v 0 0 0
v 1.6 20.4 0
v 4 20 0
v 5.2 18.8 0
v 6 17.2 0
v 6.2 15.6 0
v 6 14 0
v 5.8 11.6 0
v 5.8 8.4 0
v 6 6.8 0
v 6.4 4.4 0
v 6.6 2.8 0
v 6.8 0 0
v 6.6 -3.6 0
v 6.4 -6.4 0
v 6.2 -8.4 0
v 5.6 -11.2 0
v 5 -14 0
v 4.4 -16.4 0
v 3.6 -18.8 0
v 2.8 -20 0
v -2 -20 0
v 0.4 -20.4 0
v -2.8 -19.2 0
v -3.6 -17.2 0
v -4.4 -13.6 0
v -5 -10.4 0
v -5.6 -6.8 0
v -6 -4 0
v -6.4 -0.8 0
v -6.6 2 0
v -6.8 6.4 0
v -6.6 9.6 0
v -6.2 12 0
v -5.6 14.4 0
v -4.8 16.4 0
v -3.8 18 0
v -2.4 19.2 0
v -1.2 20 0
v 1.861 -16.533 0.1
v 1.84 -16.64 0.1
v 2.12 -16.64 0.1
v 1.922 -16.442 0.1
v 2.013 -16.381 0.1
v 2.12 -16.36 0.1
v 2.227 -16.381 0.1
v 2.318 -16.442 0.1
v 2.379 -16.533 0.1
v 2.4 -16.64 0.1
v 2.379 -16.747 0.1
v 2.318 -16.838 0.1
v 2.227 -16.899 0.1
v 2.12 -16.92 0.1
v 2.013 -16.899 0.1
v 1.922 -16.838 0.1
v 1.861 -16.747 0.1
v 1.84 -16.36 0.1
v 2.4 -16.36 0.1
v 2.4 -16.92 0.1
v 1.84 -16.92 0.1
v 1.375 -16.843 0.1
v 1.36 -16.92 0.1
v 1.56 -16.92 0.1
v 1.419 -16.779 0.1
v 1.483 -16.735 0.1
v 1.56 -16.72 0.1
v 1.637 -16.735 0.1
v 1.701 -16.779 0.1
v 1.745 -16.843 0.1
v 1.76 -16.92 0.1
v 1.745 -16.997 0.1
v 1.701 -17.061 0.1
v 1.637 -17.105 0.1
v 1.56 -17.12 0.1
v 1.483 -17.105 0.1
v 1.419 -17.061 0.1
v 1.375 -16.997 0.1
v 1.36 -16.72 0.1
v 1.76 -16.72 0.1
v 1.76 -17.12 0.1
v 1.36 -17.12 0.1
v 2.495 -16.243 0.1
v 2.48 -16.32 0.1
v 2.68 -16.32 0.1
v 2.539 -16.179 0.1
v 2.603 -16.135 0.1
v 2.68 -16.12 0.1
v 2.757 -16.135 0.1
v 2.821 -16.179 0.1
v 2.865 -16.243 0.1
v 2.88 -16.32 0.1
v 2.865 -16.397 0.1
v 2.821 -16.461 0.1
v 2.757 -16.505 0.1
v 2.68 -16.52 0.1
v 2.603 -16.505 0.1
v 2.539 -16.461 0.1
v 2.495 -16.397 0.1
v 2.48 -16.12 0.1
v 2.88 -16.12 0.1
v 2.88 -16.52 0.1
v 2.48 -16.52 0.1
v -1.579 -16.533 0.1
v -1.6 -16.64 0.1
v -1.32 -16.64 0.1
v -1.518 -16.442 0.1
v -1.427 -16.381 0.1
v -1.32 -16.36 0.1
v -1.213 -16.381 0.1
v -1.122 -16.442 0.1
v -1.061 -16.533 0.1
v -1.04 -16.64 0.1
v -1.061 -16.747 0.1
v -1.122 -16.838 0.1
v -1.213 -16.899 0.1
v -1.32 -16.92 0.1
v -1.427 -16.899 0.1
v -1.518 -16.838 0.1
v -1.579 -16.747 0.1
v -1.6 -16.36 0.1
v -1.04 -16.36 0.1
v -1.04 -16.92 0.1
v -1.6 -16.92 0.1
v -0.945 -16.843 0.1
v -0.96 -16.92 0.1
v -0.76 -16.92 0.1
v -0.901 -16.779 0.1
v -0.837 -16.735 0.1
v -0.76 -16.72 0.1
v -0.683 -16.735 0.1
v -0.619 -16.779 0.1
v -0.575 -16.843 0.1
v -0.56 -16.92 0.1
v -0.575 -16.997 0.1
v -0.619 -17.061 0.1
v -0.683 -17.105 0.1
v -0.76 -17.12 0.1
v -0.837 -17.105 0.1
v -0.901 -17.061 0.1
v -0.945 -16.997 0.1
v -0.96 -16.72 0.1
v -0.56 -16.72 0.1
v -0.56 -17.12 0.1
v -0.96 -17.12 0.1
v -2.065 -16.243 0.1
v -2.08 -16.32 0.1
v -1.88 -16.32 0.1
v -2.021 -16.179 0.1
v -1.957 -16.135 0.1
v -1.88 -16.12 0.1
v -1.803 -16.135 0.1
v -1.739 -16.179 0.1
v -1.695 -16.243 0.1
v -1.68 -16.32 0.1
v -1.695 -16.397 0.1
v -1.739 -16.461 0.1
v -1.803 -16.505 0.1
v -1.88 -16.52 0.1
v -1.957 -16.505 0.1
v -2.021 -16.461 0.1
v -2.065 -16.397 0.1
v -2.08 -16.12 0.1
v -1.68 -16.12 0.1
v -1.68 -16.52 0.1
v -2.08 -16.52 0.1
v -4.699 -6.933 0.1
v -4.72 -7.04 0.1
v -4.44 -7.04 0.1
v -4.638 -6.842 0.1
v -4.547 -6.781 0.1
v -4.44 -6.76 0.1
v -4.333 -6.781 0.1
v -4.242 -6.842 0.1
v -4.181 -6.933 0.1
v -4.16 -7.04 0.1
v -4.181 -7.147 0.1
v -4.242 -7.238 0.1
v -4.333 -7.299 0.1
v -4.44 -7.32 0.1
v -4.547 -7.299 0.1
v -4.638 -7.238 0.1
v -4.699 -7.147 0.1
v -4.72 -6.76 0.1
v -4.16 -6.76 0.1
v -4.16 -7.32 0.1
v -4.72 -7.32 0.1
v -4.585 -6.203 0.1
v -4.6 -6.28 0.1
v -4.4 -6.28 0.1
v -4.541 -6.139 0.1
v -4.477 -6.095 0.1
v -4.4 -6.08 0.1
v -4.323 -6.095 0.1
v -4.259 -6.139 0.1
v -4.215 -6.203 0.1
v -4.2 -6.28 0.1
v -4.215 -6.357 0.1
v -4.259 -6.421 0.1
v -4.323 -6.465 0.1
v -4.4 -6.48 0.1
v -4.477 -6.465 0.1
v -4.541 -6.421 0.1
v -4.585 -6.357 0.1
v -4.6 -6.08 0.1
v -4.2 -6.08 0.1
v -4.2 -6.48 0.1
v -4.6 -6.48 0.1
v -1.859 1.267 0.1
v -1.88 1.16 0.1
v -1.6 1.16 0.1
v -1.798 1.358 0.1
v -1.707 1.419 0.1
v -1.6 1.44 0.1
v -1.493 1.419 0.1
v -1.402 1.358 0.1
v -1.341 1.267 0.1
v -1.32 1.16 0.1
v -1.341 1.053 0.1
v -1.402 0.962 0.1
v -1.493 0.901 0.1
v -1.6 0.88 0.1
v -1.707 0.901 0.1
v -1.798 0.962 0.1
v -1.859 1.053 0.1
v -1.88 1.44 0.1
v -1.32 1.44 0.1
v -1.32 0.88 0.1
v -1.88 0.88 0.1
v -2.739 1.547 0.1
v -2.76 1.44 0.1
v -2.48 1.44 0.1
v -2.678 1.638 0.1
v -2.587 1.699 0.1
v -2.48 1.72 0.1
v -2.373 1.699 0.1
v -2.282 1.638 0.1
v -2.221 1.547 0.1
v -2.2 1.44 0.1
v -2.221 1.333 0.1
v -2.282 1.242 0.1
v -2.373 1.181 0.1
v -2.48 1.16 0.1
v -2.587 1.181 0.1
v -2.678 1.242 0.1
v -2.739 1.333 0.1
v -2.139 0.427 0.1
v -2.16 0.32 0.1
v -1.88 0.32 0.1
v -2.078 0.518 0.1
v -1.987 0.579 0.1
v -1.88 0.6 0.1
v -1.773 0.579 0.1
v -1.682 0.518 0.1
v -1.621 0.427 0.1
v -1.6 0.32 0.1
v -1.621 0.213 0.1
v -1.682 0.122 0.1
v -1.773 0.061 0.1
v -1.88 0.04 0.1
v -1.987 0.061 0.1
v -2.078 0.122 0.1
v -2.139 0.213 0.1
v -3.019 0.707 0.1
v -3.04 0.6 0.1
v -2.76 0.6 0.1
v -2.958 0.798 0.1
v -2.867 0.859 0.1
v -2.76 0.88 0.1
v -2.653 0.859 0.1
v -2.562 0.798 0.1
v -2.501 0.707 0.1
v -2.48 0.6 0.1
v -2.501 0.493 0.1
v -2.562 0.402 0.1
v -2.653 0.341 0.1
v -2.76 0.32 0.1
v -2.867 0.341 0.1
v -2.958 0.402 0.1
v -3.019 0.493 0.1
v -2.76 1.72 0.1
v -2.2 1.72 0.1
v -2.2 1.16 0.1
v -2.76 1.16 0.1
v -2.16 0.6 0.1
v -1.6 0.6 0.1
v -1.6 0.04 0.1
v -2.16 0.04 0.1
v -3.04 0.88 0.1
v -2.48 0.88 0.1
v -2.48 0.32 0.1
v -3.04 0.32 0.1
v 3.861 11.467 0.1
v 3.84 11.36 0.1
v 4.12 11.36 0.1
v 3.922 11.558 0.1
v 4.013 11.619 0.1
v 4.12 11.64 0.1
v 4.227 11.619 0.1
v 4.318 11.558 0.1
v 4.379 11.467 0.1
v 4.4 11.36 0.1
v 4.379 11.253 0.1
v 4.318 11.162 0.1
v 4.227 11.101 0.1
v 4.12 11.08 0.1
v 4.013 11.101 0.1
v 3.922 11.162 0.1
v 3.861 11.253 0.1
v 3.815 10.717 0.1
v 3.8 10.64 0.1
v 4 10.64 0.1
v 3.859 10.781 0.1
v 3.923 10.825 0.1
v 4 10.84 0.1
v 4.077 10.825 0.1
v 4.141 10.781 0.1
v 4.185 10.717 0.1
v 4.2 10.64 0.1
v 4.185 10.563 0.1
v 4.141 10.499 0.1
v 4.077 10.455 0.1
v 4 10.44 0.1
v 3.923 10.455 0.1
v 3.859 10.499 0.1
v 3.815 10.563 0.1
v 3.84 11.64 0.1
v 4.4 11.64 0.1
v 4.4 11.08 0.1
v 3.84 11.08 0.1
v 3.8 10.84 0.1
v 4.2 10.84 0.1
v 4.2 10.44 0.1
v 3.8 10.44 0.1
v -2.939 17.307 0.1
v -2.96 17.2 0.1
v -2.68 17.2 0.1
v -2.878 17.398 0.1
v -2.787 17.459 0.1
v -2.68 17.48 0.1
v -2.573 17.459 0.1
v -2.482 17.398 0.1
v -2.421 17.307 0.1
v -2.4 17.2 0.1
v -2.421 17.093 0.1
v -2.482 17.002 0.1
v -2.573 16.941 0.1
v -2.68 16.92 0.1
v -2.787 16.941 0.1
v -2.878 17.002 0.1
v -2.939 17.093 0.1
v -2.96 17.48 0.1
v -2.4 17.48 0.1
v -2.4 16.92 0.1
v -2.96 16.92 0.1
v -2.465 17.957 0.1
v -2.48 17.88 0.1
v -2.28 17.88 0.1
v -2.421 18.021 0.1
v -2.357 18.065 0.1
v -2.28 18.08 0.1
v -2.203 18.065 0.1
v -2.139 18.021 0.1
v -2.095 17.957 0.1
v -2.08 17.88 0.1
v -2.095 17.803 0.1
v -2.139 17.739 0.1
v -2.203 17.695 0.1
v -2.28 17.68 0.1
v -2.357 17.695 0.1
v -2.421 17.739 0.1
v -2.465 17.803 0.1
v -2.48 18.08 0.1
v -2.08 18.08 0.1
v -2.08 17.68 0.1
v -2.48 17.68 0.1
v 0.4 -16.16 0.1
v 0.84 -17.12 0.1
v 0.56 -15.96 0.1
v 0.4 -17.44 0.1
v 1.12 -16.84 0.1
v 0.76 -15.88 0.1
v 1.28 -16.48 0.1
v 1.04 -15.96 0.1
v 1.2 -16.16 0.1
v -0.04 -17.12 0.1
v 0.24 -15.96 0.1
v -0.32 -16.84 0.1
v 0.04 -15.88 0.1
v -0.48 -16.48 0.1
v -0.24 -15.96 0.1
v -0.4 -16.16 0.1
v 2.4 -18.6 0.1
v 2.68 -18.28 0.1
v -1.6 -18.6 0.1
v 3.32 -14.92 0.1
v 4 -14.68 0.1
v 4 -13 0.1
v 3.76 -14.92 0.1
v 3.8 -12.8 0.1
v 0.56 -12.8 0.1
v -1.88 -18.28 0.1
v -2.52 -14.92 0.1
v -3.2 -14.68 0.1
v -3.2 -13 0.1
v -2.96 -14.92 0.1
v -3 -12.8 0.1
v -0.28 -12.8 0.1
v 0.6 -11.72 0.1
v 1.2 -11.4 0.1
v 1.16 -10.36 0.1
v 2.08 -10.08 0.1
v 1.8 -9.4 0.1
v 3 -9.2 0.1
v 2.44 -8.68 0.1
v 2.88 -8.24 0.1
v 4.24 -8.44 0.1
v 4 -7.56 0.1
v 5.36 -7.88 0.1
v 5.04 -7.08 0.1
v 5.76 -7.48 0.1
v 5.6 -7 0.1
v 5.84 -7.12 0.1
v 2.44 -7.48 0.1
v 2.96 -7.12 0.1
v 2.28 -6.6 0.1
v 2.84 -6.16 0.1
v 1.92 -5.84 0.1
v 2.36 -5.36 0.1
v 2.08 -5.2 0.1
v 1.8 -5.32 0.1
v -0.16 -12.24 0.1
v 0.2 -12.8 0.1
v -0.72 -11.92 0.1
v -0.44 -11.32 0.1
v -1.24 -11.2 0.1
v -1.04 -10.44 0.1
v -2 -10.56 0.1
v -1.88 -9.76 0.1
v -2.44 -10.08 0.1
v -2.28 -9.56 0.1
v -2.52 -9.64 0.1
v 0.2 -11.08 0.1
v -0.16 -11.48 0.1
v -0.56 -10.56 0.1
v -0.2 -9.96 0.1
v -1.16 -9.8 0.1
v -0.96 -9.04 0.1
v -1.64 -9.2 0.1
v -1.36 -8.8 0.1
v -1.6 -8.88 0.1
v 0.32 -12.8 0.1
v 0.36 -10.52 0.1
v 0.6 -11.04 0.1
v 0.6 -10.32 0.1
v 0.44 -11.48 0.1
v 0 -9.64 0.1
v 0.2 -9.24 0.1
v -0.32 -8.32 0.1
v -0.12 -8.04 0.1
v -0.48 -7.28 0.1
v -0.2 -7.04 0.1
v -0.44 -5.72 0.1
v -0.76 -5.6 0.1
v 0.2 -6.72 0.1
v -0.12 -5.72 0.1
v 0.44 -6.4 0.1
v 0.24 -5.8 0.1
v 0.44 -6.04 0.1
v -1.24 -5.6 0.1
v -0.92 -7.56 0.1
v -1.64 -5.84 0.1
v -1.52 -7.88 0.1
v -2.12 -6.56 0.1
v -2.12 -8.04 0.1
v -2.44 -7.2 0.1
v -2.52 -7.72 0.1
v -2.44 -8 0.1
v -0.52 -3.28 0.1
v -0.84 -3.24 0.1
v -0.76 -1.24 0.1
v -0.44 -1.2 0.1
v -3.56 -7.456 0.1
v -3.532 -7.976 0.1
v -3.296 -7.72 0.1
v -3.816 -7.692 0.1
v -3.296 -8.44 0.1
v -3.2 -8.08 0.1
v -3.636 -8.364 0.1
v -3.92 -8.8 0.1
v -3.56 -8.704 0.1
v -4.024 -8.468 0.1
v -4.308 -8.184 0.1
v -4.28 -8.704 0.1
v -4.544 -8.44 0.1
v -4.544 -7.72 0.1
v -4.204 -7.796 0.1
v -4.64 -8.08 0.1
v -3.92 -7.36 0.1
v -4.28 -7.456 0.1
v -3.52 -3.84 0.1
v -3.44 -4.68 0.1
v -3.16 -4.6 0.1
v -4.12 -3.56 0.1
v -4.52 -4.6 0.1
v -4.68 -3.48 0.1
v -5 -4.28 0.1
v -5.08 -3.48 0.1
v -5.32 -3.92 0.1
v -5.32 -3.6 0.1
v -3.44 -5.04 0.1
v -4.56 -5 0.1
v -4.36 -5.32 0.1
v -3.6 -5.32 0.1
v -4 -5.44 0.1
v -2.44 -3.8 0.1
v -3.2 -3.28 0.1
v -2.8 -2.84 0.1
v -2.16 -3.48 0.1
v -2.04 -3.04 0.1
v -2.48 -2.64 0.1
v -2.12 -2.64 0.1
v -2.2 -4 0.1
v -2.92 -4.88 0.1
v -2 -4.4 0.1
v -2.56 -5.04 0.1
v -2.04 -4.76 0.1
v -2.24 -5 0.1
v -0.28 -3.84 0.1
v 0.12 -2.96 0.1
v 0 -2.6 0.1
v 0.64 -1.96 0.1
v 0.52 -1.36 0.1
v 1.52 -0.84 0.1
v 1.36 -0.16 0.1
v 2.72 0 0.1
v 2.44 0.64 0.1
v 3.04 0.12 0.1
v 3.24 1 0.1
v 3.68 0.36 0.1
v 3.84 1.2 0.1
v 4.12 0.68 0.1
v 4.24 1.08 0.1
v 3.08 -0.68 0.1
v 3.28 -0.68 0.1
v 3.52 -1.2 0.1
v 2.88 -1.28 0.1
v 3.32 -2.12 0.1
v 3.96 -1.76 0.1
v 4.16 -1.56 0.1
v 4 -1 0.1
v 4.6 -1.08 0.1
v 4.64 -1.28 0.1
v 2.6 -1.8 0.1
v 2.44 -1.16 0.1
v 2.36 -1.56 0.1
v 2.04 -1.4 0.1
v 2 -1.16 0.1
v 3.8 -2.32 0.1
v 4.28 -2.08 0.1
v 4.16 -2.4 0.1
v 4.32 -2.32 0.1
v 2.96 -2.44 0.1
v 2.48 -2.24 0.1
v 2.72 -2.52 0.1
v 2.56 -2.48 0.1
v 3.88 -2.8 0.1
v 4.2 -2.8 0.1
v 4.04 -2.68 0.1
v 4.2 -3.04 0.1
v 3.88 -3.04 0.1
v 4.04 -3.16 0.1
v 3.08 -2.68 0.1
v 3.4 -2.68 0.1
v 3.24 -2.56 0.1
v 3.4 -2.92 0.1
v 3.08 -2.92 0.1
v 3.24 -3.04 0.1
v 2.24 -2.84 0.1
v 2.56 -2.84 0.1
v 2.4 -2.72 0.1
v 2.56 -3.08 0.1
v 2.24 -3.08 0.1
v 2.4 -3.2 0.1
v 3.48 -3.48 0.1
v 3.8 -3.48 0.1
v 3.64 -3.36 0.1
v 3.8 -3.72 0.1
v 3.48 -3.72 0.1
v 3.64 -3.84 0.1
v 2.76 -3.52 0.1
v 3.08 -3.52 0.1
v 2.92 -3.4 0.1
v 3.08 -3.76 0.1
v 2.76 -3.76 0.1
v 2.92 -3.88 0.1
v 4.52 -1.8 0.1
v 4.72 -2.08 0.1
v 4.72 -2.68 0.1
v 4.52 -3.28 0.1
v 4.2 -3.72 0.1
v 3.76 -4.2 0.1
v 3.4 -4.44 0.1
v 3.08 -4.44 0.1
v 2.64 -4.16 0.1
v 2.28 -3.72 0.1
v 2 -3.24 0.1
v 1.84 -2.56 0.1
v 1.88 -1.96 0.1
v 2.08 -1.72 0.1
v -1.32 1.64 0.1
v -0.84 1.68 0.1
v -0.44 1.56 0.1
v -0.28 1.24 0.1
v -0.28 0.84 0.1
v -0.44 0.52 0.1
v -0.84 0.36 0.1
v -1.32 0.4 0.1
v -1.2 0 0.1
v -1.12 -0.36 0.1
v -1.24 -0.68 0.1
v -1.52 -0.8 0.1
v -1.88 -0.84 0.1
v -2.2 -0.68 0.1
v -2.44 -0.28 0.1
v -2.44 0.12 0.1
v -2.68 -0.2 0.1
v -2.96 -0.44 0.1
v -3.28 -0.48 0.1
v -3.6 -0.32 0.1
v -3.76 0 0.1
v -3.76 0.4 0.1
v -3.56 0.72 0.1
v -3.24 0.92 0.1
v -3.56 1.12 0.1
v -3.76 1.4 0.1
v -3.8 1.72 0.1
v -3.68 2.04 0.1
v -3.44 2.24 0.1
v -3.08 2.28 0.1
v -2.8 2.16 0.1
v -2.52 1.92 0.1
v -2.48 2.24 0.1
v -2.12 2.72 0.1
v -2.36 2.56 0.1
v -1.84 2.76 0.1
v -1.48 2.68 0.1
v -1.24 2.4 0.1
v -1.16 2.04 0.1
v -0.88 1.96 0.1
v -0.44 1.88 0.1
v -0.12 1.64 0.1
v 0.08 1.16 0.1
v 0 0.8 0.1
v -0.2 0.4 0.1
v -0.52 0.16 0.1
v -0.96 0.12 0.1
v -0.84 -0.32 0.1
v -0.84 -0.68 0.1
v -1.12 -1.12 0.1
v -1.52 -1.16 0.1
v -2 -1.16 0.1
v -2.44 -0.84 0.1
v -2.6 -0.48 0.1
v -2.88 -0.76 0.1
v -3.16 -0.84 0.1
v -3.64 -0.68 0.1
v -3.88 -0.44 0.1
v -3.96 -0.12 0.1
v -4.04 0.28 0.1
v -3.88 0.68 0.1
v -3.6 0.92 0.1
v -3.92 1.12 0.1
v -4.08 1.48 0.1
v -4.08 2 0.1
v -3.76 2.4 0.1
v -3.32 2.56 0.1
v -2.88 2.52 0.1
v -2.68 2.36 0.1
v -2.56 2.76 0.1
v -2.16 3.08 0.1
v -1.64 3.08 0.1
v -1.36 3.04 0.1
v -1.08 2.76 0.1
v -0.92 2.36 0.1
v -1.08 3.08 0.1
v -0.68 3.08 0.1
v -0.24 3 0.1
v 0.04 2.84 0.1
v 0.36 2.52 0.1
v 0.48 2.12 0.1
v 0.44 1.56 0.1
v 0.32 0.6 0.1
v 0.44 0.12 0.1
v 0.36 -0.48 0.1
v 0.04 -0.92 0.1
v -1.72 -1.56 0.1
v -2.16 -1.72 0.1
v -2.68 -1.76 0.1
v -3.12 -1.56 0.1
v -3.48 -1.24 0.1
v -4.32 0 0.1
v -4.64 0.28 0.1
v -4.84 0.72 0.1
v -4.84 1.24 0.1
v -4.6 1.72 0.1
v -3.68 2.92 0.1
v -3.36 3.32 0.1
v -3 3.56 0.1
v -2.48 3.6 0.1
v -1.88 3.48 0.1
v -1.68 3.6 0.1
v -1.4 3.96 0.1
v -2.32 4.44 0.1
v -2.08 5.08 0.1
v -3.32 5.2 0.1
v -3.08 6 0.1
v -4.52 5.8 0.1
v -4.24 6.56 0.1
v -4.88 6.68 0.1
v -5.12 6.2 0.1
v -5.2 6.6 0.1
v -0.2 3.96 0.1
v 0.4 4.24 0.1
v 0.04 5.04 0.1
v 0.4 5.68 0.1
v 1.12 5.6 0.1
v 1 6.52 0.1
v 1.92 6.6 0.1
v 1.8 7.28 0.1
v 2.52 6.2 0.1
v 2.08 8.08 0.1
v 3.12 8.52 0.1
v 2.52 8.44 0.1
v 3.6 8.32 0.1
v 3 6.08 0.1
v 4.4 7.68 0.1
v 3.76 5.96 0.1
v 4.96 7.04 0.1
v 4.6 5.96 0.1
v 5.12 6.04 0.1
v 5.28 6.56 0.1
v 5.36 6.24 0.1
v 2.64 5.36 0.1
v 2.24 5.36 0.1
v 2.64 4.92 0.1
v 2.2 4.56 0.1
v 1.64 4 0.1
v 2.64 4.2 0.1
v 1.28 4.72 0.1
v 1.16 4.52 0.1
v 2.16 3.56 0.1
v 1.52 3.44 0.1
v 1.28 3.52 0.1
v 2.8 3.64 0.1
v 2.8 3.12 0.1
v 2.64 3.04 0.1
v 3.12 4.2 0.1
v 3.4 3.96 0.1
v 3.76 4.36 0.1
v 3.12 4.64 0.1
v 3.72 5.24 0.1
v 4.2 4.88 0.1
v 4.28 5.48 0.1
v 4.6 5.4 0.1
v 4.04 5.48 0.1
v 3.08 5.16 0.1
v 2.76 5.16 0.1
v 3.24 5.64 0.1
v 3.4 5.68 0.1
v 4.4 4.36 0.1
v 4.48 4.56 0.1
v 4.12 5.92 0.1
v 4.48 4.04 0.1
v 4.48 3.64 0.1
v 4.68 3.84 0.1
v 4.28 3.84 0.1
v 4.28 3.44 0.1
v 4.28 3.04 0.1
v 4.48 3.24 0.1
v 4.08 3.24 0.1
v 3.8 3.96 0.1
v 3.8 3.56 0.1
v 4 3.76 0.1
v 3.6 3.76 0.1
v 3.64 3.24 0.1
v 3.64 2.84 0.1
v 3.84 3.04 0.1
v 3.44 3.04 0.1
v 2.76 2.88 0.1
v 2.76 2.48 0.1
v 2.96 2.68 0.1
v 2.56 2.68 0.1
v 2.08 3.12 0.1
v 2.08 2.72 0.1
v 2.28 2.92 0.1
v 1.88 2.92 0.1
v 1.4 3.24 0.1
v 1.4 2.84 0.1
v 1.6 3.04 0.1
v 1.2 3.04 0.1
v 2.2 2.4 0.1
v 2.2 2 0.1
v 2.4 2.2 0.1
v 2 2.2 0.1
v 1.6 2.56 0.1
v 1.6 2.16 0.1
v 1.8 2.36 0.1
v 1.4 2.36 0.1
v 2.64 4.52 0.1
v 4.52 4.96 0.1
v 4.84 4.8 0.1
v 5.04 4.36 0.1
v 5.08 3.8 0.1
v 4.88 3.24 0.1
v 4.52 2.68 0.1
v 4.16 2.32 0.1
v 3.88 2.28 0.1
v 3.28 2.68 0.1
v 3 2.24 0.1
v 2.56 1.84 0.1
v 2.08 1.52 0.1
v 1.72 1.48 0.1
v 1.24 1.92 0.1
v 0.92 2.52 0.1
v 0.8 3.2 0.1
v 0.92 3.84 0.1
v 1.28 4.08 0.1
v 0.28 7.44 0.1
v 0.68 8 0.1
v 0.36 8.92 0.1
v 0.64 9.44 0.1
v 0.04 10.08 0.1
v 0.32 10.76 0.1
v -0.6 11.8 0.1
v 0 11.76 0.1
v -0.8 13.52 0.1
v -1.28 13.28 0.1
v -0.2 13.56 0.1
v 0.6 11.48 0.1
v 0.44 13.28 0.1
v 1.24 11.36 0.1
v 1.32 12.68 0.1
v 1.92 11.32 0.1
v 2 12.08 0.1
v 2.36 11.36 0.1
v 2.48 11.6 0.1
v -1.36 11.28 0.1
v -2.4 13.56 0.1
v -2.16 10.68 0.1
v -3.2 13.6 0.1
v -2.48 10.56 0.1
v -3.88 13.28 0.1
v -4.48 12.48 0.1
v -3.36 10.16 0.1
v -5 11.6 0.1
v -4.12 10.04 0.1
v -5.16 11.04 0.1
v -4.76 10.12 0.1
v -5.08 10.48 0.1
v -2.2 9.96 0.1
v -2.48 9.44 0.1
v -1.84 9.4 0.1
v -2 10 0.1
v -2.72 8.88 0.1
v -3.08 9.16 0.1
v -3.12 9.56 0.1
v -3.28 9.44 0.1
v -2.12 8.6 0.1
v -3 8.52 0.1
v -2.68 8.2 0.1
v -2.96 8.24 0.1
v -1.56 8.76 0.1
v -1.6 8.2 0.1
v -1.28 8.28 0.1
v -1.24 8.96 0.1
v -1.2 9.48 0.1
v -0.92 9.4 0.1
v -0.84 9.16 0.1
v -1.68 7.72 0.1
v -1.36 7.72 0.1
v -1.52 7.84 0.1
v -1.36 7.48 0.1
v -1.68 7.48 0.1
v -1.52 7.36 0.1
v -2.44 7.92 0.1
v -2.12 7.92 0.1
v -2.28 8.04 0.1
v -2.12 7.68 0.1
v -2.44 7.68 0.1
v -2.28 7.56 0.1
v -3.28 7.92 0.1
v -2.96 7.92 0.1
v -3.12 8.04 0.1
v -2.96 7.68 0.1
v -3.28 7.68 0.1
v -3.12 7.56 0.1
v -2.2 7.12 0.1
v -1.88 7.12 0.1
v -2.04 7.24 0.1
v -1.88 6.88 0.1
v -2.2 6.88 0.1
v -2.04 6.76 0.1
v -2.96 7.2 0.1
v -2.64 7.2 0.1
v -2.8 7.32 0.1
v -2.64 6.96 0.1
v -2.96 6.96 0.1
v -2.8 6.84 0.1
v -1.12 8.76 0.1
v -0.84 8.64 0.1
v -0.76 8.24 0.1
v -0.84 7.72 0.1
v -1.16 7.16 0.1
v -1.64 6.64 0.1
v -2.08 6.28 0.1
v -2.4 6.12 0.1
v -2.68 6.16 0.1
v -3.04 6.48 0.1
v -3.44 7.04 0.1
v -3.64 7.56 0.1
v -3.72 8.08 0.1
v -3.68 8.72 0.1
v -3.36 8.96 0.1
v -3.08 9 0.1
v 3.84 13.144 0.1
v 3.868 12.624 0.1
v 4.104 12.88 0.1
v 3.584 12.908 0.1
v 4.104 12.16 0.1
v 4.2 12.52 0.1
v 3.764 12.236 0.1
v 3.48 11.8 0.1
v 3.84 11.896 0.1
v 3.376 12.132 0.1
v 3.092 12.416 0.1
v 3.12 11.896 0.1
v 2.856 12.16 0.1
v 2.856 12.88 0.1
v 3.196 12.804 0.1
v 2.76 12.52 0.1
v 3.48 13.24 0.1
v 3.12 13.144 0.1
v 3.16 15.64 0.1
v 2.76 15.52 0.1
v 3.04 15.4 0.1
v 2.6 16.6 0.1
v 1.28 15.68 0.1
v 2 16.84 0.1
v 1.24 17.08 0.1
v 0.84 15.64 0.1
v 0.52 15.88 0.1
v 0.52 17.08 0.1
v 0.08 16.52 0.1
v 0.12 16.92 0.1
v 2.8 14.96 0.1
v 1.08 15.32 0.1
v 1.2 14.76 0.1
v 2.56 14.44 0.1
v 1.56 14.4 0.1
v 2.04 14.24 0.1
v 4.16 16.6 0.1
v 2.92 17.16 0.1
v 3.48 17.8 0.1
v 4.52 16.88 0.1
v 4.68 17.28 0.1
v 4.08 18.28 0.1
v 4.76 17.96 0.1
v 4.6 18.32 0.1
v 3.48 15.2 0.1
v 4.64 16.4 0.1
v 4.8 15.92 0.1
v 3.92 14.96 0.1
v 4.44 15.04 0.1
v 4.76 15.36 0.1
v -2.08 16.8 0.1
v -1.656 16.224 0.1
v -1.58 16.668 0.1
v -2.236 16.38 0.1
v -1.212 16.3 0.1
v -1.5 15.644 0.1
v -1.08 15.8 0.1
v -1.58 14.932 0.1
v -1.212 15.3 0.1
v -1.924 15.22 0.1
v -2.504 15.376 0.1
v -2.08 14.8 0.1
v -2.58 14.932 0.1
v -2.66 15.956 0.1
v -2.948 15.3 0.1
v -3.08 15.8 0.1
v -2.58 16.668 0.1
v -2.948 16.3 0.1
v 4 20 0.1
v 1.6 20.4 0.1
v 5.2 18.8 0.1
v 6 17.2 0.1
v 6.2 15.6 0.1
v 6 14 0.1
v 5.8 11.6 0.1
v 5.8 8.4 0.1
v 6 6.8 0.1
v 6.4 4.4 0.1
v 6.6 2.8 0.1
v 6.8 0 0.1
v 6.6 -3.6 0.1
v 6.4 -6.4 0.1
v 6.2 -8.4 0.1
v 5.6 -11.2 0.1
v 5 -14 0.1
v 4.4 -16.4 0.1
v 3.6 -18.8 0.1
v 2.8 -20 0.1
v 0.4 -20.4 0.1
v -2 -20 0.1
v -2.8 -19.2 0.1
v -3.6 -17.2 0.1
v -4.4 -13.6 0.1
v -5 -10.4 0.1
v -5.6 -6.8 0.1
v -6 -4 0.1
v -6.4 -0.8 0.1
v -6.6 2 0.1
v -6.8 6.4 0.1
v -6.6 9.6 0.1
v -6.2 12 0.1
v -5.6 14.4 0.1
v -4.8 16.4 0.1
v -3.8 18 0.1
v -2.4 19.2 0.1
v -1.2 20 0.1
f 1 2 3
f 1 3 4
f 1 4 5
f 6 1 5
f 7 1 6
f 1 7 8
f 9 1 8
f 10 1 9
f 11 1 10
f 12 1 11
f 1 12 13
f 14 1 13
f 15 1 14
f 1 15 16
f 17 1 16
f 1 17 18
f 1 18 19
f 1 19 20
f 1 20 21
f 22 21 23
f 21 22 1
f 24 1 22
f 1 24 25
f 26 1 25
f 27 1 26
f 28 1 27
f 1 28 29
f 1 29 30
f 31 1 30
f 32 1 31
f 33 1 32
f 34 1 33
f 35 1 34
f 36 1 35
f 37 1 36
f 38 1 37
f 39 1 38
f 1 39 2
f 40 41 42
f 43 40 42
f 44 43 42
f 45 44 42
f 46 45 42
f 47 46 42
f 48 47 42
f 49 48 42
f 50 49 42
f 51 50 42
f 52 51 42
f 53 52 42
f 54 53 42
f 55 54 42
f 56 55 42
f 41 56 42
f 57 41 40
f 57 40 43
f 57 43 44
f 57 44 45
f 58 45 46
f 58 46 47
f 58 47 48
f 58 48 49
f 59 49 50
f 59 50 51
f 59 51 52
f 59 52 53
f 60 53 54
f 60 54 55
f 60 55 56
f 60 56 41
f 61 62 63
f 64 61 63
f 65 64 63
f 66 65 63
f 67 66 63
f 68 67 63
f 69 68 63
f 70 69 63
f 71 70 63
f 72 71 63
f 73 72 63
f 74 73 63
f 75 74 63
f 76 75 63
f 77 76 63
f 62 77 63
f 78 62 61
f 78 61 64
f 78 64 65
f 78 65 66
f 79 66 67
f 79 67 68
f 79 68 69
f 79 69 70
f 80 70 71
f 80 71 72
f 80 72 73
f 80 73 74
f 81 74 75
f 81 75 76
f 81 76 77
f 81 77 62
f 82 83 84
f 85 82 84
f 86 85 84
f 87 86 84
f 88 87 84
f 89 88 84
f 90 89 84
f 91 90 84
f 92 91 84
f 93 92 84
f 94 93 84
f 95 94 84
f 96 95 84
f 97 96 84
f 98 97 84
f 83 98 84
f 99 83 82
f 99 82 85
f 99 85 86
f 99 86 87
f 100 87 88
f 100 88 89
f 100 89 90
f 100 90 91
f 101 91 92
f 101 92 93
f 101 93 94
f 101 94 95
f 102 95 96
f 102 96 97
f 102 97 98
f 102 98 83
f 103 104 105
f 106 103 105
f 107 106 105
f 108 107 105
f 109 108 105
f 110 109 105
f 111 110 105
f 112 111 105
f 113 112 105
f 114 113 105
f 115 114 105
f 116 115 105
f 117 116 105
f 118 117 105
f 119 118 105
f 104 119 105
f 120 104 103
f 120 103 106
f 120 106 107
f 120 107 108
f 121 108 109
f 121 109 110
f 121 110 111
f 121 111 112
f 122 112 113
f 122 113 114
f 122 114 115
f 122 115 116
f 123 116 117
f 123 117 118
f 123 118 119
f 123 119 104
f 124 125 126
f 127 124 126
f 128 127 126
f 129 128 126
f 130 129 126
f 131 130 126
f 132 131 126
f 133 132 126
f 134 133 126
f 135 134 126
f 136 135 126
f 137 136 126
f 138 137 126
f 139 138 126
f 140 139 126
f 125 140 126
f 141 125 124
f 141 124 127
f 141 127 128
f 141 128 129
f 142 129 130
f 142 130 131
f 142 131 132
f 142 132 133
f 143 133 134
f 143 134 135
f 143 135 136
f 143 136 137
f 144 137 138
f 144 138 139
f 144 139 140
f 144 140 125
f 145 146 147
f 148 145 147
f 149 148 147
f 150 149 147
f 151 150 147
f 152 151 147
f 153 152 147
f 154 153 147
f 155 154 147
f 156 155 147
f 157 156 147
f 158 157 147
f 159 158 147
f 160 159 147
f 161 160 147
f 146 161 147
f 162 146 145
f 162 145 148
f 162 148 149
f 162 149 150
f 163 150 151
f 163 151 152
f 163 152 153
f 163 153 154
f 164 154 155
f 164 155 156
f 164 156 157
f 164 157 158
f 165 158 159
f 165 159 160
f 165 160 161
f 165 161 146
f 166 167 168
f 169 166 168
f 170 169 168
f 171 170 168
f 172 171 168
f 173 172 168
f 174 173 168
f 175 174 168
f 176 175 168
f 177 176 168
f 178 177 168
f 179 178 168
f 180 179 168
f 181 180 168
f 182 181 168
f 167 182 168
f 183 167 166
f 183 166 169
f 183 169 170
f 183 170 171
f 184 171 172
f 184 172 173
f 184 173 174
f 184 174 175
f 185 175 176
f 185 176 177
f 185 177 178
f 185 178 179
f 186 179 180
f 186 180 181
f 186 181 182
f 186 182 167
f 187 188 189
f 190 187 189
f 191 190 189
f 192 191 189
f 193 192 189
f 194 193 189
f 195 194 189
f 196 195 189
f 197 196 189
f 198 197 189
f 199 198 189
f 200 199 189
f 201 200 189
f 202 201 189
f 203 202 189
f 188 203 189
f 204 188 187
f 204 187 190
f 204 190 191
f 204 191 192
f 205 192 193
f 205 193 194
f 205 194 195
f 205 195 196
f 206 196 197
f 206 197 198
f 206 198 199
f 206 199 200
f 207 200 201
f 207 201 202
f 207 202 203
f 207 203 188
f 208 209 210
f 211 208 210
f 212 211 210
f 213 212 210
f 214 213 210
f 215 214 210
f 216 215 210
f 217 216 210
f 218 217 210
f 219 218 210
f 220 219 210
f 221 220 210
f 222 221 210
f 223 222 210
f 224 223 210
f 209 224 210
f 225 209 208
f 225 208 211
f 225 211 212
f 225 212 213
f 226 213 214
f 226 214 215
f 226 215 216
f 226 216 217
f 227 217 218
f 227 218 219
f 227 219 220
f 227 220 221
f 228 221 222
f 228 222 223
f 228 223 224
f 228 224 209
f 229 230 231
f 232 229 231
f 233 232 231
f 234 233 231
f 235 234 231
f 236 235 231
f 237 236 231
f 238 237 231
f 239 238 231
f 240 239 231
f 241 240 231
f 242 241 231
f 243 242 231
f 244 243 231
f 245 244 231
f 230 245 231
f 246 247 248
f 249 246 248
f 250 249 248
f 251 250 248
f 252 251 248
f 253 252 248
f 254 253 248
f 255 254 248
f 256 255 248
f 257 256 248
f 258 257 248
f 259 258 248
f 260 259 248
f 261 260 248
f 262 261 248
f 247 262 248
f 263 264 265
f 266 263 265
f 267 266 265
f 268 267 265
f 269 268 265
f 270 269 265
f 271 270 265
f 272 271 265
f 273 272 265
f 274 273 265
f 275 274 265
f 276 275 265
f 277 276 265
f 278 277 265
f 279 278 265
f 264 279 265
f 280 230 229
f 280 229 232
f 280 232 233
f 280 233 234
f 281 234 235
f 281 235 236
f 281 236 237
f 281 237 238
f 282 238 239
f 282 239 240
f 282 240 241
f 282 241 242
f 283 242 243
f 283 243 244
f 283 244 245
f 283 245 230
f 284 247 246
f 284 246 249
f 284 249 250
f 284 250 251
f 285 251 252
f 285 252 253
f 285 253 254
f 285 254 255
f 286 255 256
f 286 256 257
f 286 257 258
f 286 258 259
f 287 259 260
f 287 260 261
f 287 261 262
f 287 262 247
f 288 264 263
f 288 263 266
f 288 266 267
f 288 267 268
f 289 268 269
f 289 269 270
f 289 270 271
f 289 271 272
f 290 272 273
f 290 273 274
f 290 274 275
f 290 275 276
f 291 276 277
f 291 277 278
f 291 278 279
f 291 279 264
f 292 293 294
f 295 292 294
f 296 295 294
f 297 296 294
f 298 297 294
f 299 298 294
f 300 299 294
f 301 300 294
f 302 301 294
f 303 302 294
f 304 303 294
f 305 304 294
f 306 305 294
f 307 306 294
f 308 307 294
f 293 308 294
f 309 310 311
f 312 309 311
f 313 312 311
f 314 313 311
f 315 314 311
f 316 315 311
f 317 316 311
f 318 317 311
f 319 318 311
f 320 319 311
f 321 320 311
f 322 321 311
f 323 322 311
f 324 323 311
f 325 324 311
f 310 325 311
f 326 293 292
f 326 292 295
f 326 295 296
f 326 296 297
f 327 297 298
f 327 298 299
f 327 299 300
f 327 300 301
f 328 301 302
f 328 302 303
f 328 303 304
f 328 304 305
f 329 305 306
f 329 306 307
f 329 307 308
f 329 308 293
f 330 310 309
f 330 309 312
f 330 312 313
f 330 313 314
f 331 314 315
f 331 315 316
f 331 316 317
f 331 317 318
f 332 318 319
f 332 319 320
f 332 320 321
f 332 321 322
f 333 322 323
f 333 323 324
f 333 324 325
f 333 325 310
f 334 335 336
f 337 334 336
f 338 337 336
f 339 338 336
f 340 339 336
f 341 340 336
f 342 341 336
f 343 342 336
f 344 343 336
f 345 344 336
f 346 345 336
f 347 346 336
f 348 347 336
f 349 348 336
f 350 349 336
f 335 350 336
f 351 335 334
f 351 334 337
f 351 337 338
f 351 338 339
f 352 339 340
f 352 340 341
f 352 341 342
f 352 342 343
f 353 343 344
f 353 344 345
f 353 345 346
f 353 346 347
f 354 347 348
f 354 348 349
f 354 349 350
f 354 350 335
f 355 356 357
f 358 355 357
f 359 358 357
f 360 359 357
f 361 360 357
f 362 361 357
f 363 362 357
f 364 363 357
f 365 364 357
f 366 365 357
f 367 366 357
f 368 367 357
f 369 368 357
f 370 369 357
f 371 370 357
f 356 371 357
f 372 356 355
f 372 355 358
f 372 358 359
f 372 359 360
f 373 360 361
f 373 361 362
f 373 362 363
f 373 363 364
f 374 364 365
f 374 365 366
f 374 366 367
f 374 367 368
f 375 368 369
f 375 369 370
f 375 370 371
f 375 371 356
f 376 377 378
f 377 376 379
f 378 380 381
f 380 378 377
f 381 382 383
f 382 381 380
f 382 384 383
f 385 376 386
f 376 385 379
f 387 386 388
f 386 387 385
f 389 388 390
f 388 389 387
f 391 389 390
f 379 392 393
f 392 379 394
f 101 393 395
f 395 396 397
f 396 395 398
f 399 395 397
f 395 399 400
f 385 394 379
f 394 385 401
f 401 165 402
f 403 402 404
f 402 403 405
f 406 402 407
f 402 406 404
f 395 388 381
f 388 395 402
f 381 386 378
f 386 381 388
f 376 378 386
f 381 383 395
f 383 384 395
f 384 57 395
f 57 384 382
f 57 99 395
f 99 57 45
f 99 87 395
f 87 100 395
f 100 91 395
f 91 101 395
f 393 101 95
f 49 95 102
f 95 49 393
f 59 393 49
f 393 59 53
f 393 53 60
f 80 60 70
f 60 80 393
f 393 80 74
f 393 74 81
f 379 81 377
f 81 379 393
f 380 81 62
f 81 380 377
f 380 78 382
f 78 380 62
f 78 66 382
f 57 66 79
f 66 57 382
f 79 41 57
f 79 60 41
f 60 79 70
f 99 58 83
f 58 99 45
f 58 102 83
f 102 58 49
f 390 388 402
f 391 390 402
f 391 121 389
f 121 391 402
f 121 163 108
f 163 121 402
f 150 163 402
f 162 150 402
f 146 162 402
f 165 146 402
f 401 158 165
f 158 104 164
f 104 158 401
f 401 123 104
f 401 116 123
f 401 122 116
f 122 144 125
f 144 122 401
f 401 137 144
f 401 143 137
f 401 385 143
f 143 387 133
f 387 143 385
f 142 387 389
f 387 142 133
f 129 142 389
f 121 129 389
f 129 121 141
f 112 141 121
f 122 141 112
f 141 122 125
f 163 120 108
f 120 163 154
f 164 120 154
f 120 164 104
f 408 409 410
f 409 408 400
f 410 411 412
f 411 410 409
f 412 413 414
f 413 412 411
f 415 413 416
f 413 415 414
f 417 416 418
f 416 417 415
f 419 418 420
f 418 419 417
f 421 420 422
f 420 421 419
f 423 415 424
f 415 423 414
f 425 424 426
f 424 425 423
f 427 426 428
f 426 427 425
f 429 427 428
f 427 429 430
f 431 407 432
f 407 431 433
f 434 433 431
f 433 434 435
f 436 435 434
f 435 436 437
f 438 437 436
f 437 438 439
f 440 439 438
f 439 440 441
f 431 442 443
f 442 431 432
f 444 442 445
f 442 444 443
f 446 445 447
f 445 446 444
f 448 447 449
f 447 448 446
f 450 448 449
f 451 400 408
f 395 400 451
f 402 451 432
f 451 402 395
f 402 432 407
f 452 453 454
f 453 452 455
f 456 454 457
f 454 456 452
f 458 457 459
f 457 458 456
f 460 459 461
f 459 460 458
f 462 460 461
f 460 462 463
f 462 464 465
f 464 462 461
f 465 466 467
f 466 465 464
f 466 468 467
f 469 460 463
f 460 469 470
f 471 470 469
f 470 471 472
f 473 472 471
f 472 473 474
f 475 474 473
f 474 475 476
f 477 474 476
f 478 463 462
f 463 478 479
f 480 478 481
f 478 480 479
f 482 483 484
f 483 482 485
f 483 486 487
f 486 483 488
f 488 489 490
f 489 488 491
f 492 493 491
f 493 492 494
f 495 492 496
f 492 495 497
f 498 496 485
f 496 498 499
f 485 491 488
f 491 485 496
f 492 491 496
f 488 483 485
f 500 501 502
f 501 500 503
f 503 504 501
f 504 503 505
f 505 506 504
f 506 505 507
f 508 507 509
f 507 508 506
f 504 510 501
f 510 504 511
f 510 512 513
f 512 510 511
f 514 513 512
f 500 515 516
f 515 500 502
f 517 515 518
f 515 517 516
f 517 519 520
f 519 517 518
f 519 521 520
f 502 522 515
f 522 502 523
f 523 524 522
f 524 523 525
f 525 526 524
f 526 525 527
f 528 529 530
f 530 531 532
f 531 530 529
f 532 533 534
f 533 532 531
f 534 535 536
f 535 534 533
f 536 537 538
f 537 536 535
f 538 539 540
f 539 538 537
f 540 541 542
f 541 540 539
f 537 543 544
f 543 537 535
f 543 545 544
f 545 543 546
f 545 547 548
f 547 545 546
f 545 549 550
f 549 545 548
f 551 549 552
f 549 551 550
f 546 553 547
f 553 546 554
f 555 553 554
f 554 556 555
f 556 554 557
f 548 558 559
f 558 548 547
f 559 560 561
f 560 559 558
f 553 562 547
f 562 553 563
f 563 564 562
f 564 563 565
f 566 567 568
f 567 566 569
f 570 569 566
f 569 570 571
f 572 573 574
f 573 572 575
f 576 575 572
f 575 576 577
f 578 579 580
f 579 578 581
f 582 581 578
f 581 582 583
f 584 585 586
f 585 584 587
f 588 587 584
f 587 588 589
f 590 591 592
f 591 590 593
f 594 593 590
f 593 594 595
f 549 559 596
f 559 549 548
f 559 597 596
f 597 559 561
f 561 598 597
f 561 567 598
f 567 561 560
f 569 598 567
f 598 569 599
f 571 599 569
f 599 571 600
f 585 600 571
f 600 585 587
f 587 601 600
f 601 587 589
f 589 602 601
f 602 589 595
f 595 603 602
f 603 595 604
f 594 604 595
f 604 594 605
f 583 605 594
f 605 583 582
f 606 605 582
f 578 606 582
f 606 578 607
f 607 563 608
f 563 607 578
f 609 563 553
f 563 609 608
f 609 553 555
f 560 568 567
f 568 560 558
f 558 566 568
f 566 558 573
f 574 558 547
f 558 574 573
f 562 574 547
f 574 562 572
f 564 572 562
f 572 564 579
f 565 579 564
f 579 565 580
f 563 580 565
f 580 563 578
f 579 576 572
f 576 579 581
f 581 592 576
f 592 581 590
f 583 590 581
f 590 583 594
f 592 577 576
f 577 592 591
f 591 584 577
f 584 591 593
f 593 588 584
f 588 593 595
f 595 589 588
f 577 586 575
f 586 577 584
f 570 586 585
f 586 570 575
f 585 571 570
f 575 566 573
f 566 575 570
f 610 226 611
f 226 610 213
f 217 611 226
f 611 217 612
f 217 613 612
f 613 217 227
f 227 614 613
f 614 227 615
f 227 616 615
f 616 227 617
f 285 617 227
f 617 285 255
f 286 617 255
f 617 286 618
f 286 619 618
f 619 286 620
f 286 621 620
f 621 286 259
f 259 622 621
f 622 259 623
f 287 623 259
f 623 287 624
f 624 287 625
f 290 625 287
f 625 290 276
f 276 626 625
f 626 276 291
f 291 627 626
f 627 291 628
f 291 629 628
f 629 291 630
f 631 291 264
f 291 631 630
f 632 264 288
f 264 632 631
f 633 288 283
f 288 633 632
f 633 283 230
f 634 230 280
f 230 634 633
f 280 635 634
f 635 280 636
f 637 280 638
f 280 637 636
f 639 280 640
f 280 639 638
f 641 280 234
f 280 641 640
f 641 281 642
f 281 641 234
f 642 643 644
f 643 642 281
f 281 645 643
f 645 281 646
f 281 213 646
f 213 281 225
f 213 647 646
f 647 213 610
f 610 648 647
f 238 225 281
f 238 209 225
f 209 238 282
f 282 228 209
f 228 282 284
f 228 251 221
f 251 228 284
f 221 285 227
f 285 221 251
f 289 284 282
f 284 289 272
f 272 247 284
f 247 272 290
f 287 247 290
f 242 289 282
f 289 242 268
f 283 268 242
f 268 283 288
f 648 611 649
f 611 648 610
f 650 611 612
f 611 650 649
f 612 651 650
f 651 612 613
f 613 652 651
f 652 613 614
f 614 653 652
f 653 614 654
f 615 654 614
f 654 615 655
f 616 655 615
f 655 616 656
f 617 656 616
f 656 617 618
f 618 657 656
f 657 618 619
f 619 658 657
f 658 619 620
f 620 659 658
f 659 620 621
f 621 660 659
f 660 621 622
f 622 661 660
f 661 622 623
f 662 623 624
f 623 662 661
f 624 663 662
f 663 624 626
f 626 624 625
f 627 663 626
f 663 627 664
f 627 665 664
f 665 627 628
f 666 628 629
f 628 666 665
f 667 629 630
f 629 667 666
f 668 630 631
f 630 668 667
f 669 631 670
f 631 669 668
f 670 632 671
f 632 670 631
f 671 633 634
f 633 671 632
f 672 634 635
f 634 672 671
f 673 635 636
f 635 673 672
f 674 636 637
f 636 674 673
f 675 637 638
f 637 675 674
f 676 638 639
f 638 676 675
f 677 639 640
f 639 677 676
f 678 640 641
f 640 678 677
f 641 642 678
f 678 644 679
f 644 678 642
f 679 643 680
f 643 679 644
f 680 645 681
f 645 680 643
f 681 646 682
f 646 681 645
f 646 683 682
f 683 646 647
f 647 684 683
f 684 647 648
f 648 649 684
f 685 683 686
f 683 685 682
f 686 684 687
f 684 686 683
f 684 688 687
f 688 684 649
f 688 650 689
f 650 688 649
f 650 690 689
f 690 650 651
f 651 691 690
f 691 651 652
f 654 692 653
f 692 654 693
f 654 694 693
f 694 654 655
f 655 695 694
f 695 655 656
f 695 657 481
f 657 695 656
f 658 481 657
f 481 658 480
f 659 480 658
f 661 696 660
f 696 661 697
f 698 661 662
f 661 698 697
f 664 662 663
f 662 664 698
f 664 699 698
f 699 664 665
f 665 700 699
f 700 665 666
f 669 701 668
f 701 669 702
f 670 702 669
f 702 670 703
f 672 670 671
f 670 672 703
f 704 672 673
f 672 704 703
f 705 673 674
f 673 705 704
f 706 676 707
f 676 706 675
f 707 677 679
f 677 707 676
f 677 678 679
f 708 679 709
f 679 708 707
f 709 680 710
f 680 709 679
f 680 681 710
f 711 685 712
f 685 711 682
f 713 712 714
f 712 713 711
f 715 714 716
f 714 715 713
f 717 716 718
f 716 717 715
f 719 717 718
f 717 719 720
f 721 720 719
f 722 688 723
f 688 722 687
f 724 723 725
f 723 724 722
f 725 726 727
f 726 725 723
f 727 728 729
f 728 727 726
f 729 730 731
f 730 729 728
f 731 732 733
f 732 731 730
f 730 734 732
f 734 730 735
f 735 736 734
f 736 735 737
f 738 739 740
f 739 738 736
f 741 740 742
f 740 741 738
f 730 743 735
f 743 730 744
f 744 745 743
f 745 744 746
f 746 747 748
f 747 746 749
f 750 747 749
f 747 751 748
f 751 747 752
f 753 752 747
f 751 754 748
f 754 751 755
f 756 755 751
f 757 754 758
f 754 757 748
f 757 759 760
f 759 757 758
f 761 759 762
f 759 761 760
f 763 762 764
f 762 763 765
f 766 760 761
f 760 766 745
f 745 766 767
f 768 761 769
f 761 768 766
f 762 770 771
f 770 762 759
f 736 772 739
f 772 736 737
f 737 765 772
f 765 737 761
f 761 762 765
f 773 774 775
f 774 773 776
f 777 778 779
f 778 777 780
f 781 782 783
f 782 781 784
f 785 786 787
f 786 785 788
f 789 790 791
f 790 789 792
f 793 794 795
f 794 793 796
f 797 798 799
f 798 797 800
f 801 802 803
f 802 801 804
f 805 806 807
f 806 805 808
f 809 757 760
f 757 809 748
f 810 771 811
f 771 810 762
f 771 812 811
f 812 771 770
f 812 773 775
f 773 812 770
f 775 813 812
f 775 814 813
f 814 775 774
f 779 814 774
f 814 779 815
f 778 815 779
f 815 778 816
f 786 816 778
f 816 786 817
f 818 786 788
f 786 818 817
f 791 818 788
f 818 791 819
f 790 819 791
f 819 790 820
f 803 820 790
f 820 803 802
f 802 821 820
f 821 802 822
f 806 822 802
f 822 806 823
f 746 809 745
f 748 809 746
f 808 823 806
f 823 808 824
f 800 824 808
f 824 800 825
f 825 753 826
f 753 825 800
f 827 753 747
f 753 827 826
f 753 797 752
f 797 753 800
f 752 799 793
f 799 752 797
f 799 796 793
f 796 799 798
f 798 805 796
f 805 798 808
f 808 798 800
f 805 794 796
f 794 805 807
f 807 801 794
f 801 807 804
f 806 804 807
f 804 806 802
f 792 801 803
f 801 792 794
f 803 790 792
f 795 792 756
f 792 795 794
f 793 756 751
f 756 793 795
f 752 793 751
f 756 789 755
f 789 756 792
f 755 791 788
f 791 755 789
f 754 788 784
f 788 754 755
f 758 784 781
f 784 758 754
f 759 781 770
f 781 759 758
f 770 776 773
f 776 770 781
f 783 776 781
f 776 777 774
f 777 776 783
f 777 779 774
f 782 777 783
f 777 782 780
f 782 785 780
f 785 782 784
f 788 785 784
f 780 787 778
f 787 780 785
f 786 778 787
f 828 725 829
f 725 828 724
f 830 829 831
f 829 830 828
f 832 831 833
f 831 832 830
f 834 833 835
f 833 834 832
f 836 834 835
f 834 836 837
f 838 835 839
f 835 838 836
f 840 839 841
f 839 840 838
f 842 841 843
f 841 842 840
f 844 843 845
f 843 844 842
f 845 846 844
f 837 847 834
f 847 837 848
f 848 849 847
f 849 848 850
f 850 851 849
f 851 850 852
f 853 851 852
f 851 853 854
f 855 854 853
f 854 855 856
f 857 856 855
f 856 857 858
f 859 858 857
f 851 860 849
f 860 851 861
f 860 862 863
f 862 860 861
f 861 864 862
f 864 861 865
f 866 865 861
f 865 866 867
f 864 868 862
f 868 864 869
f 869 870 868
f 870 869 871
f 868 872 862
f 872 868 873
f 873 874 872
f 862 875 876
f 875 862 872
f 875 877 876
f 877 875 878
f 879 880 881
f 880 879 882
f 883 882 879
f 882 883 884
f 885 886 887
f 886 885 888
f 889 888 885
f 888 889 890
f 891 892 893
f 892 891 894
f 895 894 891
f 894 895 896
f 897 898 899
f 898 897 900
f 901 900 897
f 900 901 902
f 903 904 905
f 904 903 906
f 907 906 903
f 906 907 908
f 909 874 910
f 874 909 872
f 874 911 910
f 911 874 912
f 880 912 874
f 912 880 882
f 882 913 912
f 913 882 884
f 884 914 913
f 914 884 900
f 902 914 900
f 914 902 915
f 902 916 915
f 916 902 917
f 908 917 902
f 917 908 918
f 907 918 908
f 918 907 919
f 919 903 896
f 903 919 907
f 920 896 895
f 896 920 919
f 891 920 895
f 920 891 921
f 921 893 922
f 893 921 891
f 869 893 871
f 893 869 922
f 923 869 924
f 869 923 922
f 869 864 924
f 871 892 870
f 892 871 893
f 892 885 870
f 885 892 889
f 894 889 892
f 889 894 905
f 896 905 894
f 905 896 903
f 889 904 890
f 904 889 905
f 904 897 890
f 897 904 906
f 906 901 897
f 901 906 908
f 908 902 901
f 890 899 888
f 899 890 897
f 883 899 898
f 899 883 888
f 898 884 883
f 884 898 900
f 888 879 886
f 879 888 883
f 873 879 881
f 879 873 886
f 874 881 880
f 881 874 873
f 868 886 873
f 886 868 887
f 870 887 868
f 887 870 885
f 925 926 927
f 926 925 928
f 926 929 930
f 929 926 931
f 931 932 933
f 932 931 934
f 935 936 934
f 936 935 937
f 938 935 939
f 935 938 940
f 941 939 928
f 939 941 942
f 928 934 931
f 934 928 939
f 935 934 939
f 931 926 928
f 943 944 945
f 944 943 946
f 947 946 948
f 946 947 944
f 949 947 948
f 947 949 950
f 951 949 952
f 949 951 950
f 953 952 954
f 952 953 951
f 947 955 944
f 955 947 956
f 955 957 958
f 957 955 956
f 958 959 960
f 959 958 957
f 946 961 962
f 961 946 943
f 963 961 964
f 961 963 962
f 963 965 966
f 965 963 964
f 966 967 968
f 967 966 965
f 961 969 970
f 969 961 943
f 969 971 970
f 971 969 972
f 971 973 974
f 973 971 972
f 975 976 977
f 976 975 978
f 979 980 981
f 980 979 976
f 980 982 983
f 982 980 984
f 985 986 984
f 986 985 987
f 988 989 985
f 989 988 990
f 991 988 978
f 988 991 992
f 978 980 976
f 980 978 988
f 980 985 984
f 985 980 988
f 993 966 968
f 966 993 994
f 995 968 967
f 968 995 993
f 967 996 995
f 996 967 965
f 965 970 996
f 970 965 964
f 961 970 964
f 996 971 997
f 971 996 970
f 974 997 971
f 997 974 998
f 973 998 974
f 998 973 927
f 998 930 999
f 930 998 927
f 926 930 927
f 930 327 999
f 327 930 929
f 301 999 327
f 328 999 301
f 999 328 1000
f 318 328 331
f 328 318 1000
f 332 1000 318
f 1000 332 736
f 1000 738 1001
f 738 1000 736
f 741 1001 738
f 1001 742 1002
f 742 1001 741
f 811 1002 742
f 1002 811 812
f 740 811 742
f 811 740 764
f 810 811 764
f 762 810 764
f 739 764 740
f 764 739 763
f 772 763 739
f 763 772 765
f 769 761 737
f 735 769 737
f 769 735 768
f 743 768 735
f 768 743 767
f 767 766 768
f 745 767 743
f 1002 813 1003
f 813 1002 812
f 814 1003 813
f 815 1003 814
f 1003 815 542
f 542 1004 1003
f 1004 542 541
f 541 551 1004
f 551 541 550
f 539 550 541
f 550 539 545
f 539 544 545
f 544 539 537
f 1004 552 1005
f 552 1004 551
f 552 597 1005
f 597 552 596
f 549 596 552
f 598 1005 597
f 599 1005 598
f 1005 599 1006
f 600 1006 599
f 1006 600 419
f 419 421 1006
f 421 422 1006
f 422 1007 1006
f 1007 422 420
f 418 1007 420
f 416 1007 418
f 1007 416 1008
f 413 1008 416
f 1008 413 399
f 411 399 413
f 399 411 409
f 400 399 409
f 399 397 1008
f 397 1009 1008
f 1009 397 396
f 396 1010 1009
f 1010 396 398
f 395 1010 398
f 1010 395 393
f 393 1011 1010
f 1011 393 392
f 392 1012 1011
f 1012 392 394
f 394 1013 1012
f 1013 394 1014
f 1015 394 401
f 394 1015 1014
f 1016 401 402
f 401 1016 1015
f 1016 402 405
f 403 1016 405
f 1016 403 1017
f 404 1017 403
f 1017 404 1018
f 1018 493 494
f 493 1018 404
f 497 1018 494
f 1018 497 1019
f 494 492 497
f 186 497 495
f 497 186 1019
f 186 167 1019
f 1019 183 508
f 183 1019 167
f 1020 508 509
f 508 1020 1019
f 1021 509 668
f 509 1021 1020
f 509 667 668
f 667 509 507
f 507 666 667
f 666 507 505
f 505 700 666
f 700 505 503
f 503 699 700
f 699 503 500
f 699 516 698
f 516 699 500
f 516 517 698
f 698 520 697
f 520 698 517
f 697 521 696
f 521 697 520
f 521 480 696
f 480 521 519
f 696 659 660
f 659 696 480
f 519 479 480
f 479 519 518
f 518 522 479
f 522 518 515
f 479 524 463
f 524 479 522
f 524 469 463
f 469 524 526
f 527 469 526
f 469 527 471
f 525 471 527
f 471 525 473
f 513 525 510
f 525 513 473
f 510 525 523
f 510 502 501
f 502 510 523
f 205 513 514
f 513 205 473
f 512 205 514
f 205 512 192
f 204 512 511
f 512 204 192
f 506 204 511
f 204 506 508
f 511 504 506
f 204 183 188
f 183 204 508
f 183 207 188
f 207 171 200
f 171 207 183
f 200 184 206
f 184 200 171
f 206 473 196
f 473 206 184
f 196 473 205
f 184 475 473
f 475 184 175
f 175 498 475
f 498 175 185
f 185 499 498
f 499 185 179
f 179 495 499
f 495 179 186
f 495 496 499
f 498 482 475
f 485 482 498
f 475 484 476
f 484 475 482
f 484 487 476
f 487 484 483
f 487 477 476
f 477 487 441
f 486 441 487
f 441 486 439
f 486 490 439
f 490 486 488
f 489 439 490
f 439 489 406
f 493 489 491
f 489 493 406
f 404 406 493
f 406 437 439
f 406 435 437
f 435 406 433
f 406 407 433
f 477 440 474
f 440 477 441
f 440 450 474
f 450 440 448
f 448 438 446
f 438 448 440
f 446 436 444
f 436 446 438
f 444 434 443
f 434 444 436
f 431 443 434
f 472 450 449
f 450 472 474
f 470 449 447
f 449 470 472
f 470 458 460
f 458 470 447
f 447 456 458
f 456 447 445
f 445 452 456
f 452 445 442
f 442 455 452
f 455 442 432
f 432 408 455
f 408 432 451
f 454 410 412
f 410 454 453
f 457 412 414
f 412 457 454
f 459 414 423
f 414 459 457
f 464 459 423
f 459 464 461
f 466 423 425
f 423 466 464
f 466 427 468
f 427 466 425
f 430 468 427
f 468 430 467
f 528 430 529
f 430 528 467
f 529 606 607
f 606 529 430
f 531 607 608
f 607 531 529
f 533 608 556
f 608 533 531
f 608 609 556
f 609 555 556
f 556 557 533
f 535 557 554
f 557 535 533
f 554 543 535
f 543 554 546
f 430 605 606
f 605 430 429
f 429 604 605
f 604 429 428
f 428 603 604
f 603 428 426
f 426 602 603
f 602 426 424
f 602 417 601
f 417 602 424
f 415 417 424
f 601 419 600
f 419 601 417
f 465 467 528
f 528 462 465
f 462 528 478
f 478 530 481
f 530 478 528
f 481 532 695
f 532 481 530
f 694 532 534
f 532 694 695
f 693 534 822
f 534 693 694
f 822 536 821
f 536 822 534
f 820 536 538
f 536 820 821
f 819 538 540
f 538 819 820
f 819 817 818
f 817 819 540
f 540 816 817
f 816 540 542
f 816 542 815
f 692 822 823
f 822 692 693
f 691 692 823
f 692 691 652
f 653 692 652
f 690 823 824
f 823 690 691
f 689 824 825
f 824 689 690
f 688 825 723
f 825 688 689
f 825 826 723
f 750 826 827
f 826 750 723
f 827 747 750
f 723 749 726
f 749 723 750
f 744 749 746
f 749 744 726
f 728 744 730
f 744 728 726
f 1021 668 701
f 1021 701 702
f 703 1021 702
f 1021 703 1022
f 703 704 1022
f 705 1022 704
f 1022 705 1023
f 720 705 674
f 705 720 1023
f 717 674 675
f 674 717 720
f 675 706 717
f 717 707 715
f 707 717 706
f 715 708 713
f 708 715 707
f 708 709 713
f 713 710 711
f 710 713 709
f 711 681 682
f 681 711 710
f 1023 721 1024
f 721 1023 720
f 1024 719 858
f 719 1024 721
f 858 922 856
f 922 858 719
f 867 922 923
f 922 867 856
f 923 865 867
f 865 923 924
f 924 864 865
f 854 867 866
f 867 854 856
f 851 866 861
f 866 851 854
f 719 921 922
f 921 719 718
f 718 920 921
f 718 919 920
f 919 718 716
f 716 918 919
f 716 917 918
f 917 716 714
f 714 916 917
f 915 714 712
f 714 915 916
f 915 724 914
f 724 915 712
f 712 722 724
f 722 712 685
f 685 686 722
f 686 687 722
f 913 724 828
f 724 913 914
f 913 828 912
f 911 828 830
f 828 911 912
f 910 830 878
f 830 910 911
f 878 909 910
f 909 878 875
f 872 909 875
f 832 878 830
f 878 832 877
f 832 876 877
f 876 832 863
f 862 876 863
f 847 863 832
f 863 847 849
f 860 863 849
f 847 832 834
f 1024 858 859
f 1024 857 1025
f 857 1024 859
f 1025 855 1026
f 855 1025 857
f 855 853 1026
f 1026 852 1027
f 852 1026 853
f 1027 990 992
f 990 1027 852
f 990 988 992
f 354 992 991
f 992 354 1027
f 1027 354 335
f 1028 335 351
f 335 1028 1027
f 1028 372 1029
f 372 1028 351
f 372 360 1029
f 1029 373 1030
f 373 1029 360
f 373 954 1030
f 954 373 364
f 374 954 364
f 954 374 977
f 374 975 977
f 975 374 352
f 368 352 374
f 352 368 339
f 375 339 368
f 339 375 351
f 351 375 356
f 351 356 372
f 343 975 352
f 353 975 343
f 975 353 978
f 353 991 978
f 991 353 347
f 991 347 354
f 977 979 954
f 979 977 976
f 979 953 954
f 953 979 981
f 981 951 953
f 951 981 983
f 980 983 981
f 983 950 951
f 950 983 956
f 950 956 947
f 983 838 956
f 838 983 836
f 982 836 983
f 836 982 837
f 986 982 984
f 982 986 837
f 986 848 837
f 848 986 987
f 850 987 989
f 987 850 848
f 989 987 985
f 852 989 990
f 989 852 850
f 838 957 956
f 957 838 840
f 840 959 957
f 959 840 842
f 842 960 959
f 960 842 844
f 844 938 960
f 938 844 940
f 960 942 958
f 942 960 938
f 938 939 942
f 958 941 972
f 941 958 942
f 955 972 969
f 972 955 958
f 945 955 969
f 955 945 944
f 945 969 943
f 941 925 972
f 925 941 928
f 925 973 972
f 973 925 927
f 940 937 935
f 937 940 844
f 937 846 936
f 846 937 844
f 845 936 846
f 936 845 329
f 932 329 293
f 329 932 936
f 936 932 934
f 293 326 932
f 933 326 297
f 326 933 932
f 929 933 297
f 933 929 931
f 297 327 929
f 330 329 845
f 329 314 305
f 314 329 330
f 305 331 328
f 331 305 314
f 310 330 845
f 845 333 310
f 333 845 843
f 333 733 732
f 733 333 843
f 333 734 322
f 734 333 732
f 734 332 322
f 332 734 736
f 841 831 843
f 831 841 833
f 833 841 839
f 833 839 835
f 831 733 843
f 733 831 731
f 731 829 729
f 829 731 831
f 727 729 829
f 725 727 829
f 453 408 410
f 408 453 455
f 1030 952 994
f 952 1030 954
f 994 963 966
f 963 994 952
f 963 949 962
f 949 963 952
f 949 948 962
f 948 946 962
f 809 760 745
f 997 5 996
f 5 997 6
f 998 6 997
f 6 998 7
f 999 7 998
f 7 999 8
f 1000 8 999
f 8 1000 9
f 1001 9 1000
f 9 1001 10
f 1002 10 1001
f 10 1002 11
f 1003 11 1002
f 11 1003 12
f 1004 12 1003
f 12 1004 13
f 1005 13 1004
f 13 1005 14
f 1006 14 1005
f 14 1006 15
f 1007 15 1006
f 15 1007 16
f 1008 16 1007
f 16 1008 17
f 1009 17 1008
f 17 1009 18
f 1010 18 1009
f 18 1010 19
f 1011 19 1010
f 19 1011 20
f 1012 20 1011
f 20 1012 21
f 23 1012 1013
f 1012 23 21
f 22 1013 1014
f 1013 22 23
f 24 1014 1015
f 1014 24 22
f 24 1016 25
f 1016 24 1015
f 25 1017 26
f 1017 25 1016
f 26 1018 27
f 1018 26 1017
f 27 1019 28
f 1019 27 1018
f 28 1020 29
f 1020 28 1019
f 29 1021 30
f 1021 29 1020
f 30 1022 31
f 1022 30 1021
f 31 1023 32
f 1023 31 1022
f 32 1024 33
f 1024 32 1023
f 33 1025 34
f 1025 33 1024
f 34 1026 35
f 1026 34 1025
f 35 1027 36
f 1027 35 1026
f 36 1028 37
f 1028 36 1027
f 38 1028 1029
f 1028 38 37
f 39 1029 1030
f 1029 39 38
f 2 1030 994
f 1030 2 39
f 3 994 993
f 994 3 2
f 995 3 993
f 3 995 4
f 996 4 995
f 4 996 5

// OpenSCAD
use <../lib.scad>
use <4620860h.scad>
function ldraw_lib__4620860i() = [
// 0 Sticker  5.1 x  1.7 with Strawberry Plant, Flowers and Butterflies Right
// 0 Name: 4620860i.dat
// 0 Author: Takeshi Takahashi [RainbowDolphin]
// 0 !LDRAW_ORG Part UPDATE 2024-10
// 0 !LICENSE Licensed under CC BY 4.0 : see CAreadme.txt
// 
// 0 BFC CERTIFY CCW
  [0,"BFC","CERTIFY"],
  [0,"BFC","CCW"],
// 
// 0 !KEYWORDS Bathroom, Bricklink 3315stk01, Brickowl 604777, house, Olivia, Rebrickable 95460, set 3315
// 
// 0 !HISTORY 2024-12-01 [OrionP] Official Update 2024-10
// 
// 
// 1 16 0 0 0 -1 0 0 0 1 0 0 0 1 4620860h.dat
  [1,16,0,0,0,-1,0,0,0,1,0,0,0,1, ldraw_lib__4620860h()],
];
module ldraw_lib__4620860i(step=0, col=false, unit=2/5, alt=false, line=0.2, solid=!$preview)
    makepoly(ldraw_lib__4620860i(), step=step, col=col, unit=unit, alt=alt, line=line, solid=solid);
ldraw_lib__4620860i(line=0.2);
